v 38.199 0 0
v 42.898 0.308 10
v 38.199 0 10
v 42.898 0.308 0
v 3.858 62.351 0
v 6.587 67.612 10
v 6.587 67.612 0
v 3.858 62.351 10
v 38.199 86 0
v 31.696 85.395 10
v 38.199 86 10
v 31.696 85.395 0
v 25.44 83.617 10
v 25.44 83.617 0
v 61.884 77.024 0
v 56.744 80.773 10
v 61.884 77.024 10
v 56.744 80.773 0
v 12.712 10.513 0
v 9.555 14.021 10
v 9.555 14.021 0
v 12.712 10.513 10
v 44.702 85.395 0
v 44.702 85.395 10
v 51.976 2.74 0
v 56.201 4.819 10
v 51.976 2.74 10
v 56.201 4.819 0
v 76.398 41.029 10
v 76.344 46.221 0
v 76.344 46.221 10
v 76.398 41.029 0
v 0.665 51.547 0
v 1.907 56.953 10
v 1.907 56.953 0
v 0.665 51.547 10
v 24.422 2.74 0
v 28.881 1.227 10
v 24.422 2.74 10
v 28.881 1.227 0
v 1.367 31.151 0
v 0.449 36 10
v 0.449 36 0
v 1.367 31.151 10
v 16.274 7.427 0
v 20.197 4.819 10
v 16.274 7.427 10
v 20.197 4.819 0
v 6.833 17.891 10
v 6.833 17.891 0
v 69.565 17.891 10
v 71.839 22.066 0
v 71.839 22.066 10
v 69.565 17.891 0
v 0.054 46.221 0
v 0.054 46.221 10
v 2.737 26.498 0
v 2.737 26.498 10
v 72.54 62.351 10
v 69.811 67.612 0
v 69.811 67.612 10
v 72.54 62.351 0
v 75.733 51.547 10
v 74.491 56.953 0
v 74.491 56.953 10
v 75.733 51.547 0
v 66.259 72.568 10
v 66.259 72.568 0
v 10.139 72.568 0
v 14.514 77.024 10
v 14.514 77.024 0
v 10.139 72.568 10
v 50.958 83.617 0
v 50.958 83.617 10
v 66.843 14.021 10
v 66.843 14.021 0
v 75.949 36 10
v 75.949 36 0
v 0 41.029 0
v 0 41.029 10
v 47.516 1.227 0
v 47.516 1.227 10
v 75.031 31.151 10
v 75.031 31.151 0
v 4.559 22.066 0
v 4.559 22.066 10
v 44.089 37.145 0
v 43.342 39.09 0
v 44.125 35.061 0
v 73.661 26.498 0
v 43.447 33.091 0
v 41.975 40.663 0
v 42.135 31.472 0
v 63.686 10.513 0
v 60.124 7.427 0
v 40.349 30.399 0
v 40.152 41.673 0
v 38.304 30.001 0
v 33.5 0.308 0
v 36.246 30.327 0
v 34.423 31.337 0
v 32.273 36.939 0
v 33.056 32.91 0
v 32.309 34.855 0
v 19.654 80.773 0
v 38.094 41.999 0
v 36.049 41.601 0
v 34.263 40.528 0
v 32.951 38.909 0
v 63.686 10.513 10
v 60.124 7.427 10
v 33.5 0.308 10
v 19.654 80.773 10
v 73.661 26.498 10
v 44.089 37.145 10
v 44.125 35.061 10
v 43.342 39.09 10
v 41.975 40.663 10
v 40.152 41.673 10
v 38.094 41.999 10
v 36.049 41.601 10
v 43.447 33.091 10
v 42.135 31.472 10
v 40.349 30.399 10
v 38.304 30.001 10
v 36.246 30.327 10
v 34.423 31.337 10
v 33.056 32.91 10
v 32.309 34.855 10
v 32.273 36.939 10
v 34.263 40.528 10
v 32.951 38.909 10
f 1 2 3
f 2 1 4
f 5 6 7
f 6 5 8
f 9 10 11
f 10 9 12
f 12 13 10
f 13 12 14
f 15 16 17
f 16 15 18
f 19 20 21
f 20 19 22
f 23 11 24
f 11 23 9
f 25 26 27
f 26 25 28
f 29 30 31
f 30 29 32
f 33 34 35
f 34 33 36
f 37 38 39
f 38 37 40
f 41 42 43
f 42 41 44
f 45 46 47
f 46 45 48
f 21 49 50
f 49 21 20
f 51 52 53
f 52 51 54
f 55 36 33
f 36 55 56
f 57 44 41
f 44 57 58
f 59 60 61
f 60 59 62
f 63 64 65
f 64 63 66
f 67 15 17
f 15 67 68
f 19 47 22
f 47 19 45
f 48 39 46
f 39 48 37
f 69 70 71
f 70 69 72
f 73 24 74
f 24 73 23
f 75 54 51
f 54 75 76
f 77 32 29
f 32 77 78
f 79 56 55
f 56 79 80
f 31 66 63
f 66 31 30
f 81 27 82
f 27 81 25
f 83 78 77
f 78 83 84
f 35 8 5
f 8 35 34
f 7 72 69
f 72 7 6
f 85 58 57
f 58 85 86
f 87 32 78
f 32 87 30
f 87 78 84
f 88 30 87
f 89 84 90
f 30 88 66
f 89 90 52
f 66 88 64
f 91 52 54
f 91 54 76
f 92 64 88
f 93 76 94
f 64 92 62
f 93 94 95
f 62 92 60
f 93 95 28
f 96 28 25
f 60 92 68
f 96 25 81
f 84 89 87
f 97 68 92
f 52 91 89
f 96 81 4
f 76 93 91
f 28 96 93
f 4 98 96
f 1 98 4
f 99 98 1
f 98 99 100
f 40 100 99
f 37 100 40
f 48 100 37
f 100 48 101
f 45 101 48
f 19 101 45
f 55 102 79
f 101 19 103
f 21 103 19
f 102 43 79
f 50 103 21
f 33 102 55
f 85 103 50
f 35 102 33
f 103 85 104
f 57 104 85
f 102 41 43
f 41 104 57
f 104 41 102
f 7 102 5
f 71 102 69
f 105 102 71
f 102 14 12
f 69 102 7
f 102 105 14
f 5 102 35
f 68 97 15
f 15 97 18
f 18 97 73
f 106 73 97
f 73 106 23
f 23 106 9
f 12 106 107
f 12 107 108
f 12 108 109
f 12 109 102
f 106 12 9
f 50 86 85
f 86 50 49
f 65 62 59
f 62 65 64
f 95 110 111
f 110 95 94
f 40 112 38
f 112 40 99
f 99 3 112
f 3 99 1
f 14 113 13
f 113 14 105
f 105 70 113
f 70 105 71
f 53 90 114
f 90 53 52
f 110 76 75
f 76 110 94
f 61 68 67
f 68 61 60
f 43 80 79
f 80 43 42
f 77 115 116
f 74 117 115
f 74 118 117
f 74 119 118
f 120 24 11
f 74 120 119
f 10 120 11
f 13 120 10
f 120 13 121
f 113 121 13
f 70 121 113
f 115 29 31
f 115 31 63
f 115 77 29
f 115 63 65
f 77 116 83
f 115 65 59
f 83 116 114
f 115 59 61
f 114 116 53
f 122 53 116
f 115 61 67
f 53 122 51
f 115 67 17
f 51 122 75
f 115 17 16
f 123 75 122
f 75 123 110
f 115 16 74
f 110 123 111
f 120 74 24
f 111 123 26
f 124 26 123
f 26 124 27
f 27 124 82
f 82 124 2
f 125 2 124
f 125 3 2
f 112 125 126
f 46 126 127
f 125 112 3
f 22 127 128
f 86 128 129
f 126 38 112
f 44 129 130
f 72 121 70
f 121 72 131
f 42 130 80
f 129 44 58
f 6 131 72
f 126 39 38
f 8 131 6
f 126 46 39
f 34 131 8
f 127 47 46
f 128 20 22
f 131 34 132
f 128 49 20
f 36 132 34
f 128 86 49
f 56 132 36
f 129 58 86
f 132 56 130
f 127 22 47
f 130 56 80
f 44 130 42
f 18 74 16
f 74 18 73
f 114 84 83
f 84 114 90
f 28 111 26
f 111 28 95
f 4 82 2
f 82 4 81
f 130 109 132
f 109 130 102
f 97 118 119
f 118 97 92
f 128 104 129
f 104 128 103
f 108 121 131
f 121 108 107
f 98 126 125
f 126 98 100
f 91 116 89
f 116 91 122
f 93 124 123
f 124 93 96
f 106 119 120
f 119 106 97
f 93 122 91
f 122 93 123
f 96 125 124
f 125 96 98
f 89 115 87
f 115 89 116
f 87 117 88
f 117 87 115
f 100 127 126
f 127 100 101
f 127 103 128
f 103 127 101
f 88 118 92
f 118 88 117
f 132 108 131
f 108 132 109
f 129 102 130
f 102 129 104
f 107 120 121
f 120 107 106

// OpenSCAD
$fn = 32;

// ----------------------------------------------------------------------
// Cam plate: single_lobe cam, base R36
// ----------------------------------------------------------------------

// --- parameters (mm) ---
base_r = 36;              // base circle radius
lobe_h = 14;              // cam lobe rise
bore_r = 6;               // shaft bore radius
plate_t = 10;             // plate thickness, Z (extrusion height)

profile = [[75.949, 36], [76.398, 41.029], [76.344, 46.221], [75.733, 51.547], [74.491, 56.953], [72.54, 62.351], [69.811, 67.612], [66.259, 72.568], [61.884, 77.024], [56.744, 80.773], [50.958, 83.617], [44.702, 85.395], [38.199, 86], [31.696, 85.395], [25.44, 83.617], [19.654, 80.773], [14.514, 77.024], [10.139, 72.568], [6.587, 67.612], [3.858, 62.351], [1.907, 56.953], [0.665, 51.547], [0.054, 46.221], [0, 41.029], [0.449, 36], [1.367, 31.151], [2.737, 26.498], [4.559, 22.066], [6.833, 17.891], [9.555, 14.021], [12.712, 10.513], [16.274, 7.427], [20.197, 4.819], [24.422, 2.74], [28.881, 1.227], [33.5, 0.308], [38.199, 0], [42.898, 0.308], [47.516, 1.227], [51.976, 2.74], [56.201, 4.819], [60.124, 7.427], [63.686, 10.513], [66.843, 14.021], [69.565, 17.891], [71.839, 22.066], [73.661, 26.498], [75.031, 31.151]];  // primary outline, 48 points, counter clockwise
void_1 = [[44.089, 37.145], [43.342, 39.09], [41.975, 40.663], [40.152, 41.673], [38.094, 41.999], [36.049, 41.601], [34.263, 40.528], [32.951, 38.909], [32.273, 36.939], [32.309, 34.855], [33.056, 32.91], [34.423, 31.337], [36.246, 30.327], [38.304, 30.001], [40.349, 30.399], [42.135, 31.472], [43.447, 33.091], [44.125, 35.061]];  // shaft bore, 18 points

// --- the one profile operation ---
difference() {
  linear_extrude(height = plate_t) polygon(points = profile);
  translate([0, 0, -1])
    linear_extrude(height = plate_t + 2) polygon(points = void_1);
}
